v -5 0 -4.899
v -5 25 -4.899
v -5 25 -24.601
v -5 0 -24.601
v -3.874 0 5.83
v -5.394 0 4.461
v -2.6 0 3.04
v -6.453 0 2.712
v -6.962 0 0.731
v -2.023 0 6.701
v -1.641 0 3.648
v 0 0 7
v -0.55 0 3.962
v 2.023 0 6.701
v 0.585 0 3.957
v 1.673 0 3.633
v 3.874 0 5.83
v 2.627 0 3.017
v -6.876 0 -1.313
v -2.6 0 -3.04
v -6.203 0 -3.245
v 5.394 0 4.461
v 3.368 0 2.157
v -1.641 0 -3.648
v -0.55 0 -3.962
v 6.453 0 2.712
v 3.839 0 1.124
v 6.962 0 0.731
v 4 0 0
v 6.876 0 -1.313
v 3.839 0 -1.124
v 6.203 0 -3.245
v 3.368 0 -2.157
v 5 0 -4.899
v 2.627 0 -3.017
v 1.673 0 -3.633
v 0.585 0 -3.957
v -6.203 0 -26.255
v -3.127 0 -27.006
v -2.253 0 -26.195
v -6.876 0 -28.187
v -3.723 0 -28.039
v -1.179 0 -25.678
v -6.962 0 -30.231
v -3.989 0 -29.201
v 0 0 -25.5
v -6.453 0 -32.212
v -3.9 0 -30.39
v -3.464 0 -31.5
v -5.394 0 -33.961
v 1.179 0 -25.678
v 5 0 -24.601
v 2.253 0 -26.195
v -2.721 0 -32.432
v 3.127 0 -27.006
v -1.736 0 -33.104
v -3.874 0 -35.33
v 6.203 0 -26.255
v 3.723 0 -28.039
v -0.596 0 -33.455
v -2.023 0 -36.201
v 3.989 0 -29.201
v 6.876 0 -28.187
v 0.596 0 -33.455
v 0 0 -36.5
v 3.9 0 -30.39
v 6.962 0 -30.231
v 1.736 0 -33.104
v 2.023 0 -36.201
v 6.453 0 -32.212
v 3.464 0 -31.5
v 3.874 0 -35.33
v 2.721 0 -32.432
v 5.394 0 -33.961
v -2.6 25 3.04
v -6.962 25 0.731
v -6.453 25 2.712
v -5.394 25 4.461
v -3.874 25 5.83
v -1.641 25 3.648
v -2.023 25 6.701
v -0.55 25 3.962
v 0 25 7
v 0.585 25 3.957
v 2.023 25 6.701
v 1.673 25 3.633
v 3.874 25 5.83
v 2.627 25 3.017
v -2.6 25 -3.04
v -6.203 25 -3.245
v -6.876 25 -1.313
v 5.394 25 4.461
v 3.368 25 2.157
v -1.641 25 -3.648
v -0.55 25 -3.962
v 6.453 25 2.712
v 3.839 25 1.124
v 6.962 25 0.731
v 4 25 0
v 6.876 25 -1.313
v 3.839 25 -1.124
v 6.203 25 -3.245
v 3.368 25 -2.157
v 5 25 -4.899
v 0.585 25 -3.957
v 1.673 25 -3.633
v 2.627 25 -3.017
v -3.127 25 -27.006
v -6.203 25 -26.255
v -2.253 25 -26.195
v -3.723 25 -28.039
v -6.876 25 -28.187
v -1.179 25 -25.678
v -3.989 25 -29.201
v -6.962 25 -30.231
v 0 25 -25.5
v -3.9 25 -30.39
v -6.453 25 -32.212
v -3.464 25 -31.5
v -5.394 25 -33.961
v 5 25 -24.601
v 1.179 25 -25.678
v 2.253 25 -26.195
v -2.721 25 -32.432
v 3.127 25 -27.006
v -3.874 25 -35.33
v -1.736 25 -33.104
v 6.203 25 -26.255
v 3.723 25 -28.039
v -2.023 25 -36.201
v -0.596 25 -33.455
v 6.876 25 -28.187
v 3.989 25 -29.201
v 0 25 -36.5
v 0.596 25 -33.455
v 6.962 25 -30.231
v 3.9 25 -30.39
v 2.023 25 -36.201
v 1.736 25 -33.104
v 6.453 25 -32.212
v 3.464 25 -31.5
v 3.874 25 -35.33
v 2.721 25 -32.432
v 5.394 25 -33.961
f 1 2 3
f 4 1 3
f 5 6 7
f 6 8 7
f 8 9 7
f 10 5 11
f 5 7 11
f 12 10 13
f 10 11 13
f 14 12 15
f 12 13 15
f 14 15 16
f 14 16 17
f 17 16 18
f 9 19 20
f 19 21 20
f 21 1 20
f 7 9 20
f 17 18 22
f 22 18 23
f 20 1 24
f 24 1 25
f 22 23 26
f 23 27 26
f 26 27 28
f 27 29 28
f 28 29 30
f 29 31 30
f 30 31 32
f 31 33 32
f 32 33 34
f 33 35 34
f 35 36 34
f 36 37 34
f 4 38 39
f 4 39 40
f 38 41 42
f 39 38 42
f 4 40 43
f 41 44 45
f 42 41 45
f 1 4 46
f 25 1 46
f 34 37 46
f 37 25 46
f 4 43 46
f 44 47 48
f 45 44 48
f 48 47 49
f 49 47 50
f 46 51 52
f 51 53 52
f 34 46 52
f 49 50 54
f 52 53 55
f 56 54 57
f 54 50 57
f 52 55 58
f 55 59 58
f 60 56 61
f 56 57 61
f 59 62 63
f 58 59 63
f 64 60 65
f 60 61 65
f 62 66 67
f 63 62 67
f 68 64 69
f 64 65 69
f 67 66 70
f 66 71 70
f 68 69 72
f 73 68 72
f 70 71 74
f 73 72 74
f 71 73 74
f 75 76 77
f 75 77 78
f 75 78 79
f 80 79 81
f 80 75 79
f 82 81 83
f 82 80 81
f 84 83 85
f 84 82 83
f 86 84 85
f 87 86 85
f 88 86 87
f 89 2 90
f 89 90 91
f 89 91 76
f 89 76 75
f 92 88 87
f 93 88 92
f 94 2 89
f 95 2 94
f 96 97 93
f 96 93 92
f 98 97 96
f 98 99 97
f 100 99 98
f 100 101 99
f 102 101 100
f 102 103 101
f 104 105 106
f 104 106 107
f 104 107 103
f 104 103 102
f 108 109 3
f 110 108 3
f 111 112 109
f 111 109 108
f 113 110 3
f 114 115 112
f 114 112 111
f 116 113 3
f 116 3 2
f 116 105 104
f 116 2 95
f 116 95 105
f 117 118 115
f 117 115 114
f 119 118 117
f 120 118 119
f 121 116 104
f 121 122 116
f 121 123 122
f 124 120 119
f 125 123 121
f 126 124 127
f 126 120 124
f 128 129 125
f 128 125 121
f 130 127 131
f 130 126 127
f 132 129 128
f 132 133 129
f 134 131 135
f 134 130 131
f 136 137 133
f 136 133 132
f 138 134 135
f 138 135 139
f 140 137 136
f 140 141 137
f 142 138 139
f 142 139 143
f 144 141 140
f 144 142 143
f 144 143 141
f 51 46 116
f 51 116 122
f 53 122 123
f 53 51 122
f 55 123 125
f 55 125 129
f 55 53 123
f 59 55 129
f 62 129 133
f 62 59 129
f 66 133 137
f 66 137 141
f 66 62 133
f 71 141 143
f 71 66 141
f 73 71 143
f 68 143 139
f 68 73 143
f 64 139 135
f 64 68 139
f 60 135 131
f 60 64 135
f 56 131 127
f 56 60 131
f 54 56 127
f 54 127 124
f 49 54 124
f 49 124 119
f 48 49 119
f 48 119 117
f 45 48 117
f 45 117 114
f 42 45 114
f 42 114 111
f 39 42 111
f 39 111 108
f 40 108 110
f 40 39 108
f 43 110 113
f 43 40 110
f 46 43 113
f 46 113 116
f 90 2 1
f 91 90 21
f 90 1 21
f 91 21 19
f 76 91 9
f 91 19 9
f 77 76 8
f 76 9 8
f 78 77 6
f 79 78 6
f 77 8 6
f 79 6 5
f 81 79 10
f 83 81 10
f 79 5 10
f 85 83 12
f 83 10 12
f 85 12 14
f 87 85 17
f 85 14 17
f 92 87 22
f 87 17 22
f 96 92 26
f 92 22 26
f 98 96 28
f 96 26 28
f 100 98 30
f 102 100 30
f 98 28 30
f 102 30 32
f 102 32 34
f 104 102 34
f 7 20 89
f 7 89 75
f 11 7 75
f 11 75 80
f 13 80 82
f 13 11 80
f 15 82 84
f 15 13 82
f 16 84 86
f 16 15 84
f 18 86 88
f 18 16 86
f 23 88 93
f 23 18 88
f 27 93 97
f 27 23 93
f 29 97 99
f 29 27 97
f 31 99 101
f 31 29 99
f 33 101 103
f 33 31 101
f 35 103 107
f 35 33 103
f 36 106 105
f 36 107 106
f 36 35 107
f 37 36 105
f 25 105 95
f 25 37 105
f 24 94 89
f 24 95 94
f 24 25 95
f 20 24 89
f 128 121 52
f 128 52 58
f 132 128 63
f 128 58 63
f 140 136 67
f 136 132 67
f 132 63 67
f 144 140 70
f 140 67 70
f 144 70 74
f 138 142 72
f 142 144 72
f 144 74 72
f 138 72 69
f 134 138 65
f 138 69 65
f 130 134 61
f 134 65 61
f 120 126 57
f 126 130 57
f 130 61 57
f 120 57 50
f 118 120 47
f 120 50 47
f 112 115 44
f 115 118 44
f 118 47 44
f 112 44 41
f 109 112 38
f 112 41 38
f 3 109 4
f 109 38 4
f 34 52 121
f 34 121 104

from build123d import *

# Parameters (mm, degrees)
SKETCH1_R           = 2
BOSS_EXTRUDE1_DEPTH = 25
BOSS_EXTRUDE2_START = -25
SKETCH3_R           = 7
SKETCH3_R_2         = 2
BOSS_EXTRUDE2_DEPTH = 25
MOVE_FACE1_BY       = 2
MOVE_FACE1_2_BY     = 2
BOSS_EXTRUDE3_START = -25
BOSS_EXTRUDE3_DEPTH = 25


with BuildPart() as part:
    # Sketch1 → Boss-Extrude1 (new body)
    with BuildSketch(Plane(origin=(0, 0, 0), x_dir=(1, 0, 0), z_dir=(0, 1, 0))):
        with BuildLine():
            Line((-5, 0), (-5, 29.5))
            ThreePointArc((-5, 29.5), (0, 34.5), (5, 29.5))
            Line((5, 29.5), (5, 0))
            ThreePointArc((5, 0), (0, -5), (-5, 0))
        make_face()
        with Locations(Location((0, 29.5, 0), (0, 0, 270))):
            Circle(SKETCH1_R, mode=Mode.SUBTRACT)
        with Locations(Location((0, 0, 0), (0, 0, 270))):
            Circle(SKETCH1_R, mode=Mode.SUBTRACT)
    extrude(amount=BOSS_EXTRUDE1_DEPTH)

    # Sketch3 → Boss-Extrude2 (add)
    # profile 1 of 2: a face of its own
    with BuildSketch(Plane(origin=(0, 25, 0), x_dir=(1, 0, 0), z_dir=(0, 1, 0)).offset(BOSS_EXTRUDE2_START)):
        with Locations((0, 29.5)):
            Circle(SKETCH3_R)
        with Locations(Location((0, 29.5, 0), (0, 0, 270))):
            Circle(SKETCH3_R_2, mode=Mode.SUBTRACT)
    # profile 2 of 2: a face of its own
    with BuildSketch(Plane(origin=(0, 25, 0), x_dir=(1, 0, 0), z_dir=(0, 1, 0)).offset(BOSS_EXTRUDE2_START)):
        Circle(SKETCH3_R)
        with Locations(Location((0, 0, 0), (0, 0, 270))):
            Circle(SKETCH3_R_2, mode=Mode.SUBTRACT)
    extrude(amount=BOSS_EXTRUDE2_DEPTH)

    # Move Face1: a curved face moved inward by 2.0
    add(Solid.thicken(part.faces().sort_by_distance((0, 12.5, -31.5))[0], -MOVE_FACE1_BY), mode=Mode.SUBTRACT)

    # Move Face1 2: a curved face moved inward by 2.0
    add(Solid.thicken(part.faces().sort_by_distance((0, 12.5, -2))[0], -MOVE_FACE1_2_BY), mode=Mode.SUBTRACT)

    # Sketch5 → Boss-Extrude3 (add)
    with BuildSketch(Plane(origin=(0, 25, 0), x_dir=(1, 0, 0), z_dir=(0, 1, 0)).offset(BOSS_EXTRUDE3_START)):
        with BuildLine():
            Line((-2.6, 3.039736831), (-2.6, -3.039736831))
            ThreePointArc((-2.6, -3.039736831), (-4, 0), (-2.6, 3.039736831))
        make_face()
    extrude(amount=BOSS_EXTRUDE3_DEPTH)


solid = part.part
